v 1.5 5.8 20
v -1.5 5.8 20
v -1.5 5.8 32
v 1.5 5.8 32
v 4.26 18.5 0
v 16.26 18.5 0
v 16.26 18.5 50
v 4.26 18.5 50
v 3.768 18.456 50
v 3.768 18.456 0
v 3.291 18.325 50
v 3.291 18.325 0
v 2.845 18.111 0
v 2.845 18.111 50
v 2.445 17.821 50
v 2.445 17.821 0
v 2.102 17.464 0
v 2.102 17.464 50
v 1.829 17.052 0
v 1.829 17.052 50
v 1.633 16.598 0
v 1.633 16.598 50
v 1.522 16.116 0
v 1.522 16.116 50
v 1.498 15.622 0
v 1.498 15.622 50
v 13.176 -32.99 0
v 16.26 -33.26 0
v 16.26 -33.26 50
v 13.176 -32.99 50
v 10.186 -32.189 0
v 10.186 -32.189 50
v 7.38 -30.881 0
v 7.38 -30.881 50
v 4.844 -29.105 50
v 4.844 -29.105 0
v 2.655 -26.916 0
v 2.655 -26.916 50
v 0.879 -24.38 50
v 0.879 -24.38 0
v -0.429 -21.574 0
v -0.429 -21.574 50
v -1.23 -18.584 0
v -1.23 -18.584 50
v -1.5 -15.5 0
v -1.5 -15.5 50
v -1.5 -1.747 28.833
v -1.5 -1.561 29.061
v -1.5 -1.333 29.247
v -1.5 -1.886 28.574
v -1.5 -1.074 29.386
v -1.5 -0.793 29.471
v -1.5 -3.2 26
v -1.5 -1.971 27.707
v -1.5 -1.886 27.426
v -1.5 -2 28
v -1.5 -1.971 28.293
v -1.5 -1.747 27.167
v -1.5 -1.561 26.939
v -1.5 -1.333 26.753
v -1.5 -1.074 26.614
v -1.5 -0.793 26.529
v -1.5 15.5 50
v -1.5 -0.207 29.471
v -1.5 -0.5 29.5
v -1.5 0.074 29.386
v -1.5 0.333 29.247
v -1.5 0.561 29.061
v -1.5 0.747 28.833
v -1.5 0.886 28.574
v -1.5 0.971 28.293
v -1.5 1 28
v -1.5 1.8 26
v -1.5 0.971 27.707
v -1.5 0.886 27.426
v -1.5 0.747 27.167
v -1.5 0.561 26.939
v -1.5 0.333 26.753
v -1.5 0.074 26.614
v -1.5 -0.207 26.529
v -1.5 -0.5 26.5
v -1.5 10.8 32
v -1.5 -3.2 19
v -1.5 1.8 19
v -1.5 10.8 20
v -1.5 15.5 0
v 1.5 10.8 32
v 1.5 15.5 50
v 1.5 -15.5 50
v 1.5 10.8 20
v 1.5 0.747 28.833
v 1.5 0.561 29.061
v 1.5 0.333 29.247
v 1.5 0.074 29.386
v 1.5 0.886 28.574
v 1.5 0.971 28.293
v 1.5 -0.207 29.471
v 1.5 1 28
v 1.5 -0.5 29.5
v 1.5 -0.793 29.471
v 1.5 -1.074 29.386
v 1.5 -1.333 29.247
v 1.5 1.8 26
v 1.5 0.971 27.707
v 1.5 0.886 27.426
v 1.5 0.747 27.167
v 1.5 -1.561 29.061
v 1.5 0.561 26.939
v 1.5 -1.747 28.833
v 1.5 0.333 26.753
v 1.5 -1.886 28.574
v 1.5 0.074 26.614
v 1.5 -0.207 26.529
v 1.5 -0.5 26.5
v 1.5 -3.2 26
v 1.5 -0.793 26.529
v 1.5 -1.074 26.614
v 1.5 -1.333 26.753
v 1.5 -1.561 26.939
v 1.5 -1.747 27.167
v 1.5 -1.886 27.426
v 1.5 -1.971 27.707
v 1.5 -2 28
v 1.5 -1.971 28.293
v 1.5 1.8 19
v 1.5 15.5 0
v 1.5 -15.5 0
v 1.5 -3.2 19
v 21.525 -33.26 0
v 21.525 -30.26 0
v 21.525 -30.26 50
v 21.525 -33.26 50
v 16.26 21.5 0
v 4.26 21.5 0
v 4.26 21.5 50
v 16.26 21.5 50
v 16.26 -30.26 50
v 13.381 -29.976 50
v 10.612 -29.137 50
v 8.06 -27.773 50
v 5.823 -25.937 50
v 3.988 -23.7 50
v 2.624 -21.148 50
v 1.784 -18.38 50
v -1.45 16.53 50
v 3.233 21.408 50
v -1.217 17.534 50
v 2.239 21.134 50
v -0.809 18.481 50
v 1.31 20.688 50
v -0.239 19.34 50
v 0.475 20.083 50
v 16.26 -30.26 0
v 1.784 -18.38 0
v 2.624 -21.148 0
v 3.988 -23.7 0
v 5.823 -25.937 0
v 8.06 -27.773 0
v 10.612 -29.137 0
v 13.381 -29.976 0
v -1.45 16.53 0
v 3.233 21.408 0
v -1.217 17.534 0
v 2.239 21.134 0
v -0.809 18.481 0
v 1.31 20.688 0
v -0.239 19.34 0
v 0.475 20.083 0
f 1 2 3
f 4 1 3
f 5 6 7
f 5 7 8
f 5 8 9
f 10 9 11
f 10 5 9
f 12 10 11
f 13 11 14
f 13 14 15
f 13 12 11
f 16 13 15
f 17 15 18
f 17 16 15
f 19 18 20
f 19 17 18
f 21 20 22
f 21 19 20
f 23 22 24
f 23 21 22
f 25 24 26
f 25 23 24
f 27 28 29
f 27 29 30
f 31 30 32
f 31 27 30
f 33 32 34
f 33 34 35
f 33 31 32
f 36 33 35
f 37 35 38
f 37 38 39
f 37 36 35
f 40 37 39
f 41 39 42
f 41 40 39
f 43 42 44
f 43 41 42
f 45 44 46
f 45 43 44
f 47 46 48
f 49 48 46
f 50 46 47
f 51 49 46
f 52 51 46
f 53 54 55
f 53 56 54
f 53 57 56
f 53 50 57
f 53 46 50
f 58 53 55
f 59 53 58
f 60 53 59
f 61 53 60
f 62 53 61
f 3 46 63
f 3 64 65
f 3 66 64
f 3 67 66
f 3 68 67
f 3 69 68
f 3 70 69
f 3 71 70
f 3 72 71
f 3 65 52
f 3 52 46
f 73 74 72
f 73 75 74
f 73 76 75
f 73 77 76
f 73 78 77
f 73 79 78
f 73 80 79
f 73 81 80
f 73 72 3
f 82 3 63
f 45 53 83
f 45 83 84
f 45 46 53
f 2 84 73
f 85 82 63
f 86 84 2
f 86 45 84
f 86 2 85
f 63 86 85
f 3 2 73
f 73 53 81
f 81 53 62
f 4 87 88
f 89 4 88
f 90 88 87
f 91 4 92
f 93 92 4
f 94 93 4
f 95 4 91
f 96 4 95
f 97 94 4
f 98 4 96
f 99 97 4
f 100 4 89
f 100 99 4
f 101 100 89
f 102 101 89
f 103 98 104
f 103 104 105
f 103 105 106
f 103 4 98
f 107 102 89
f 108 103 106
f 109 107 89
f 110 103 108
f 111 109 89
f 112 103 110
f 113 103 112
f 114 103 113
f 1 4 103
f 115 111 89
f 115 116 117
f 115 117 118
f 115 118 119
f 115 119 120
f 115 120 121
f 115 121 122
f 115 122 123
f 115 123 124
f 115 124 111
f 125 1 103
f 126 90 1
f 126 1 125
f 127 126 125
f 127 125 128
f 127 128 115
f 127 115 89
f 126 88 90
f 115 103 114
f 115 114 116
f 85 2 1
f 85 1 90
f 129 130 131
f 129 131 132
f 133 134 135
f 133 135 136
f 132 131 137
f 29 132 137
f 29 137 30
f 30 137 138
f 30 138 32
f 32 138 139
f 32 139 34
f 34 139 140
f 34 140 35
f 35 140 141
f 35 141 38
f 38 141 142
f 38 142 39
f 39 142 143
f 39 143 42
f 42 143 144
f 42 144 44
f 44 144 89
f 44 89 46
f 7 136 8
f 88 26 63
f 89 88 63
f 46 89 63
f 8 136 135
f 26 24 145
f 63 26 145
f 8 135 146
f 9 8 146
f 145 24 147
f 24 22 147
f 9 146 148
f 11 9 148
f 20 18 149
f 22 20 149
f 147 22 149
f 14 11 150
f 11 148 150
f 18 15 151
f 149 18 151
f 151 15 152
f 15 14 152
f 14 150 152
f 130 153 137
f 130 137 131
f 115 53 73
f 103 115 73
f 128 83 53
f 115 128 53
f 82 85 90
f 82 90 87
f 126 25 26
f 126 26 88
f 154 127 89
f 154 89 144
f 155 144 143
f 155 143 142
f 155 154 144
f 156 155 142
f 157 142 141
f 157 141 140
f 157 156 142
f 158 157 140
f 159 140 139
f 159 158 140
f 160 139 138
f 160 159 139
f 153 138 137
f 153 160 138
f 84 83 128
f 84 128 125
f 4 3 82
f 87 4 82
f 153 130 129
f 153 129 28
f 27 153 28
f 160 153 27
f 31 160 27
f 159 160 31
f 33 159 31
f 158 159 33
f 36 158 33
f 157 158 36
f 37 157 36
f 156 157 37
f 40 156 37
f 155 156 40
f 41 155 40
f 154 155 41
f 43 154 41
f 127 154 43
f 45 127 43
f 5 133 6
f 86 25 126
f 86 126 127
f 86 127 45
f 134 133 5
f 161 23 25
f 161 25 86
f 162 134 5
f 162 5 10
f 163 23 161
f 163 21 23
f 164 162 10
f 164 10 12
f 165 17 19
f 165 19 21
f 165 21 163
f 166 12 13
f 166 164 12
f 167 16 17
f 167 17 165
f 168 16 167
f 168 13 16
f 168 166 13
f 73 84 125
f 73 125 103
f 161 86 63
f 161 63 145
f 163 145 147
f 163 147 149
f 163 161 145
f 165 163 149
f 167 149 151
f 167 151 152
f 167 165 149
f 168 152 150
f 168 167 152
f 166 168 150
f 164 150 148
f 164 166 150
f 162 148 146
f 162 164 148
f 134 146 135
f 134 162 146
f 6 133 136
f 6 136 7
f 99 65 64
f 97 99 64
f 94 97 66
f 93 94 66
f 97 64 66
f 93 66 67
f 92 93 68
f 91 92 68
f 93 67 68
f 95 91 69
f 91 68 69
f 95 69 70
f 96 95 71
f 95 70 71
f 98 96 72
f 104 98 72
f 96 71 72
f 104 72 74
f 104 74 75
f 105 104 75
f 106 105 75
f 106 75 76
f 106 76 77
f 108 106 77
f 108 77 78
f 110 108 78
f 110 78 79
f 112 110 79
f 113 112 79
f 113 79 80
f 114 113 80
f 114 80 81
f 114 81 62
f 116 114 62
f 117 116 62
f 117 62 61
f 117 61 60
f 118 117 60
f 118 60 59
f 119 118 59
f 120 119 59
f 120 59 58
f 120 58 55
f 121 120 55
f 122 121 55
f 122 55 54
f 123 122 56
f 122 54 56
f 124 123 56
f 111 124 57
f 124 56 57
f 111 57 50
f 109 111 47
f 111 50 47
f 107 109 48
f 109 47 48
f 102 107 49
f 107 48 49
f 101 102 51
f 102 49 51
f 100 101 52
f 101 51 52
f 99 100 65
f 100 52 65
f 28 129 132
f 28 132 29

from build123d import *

# Parameters (mm, degrees)
BOSS_EXTRUDE4_DEPTH = 50
SKETCH5_R           = 1.5
SKETCH5_W           = 7
SKETCH5_H           = 5
SKETCH5_W_2         = 12
CUT_EXTRUDE1_DEPTH  = 65.314778352


with BuildPart() as part:
    # Sketch4 → Boss-Extrude4 (new body)
    with BuildSketch(Plane.XY):
        with BuildLine():
            Line((-1.5, -15.5), (-1.5, 15.5))
            ThreePointArc((-1.5, 15.5), (0.101399131, 19.727512771), (4.260080705, 21.5))
            Line((4.260080705, 21.5), (16.260080705, 21.5))
            Line((16.260080705, 21.5), (16.260080705, 18.5))
            Line((16.260080705, 18.5), (4.260080705, 18.5))
            ThreePointArc((4.260080705, 18.5), (2.265546552, 17.649902138), (1.497503795, 15.622356038))
            Line((1.497503795, 15.622356038), (1.5, 15.5))
            Line((1.5, 15.5), (1.5, -15.5))
            ThreePointArc((1.5, -15.5), (5.823127548, -25.936953157), (16.260080705, -30.260080705))
            Line((16.260080705, -30.260080705), (21.525154636, -30.260080705))
            Line((21.525154636, -30.260080705), (21.525154636, -33.260080705))
            Line((21.525154636, -33.260080705), (16.260080705, -33.260080705))
            ThreePointArc((16.260080705, -33.260080705), (3.701807204, -28.058273501), (-1.5, -15.5))
        make_face()
    extrude(amount=BOSS_EXTRUDE4_DEPTH)

    # Sketch5 → Cut-Extrude1 (cut, through all)
    with BuildSketch(Plane.ZY.offset(1.5)):
        with Locations((28, -0.5)):
            Circle(SKETCH5_R)
        with Locations((22.5, -0.7)):
            Rectangle(SKETCH5_W, SKETCH5_H)
        with Locations((26, 8.3)):
            Rectangle(SKETCH5_W_2, SKETCH5_H)
    extrude(amount=-CUT_EXTRUDE1_DEPTH, mode=Mode.SUBTRACT)


solid = part.part
